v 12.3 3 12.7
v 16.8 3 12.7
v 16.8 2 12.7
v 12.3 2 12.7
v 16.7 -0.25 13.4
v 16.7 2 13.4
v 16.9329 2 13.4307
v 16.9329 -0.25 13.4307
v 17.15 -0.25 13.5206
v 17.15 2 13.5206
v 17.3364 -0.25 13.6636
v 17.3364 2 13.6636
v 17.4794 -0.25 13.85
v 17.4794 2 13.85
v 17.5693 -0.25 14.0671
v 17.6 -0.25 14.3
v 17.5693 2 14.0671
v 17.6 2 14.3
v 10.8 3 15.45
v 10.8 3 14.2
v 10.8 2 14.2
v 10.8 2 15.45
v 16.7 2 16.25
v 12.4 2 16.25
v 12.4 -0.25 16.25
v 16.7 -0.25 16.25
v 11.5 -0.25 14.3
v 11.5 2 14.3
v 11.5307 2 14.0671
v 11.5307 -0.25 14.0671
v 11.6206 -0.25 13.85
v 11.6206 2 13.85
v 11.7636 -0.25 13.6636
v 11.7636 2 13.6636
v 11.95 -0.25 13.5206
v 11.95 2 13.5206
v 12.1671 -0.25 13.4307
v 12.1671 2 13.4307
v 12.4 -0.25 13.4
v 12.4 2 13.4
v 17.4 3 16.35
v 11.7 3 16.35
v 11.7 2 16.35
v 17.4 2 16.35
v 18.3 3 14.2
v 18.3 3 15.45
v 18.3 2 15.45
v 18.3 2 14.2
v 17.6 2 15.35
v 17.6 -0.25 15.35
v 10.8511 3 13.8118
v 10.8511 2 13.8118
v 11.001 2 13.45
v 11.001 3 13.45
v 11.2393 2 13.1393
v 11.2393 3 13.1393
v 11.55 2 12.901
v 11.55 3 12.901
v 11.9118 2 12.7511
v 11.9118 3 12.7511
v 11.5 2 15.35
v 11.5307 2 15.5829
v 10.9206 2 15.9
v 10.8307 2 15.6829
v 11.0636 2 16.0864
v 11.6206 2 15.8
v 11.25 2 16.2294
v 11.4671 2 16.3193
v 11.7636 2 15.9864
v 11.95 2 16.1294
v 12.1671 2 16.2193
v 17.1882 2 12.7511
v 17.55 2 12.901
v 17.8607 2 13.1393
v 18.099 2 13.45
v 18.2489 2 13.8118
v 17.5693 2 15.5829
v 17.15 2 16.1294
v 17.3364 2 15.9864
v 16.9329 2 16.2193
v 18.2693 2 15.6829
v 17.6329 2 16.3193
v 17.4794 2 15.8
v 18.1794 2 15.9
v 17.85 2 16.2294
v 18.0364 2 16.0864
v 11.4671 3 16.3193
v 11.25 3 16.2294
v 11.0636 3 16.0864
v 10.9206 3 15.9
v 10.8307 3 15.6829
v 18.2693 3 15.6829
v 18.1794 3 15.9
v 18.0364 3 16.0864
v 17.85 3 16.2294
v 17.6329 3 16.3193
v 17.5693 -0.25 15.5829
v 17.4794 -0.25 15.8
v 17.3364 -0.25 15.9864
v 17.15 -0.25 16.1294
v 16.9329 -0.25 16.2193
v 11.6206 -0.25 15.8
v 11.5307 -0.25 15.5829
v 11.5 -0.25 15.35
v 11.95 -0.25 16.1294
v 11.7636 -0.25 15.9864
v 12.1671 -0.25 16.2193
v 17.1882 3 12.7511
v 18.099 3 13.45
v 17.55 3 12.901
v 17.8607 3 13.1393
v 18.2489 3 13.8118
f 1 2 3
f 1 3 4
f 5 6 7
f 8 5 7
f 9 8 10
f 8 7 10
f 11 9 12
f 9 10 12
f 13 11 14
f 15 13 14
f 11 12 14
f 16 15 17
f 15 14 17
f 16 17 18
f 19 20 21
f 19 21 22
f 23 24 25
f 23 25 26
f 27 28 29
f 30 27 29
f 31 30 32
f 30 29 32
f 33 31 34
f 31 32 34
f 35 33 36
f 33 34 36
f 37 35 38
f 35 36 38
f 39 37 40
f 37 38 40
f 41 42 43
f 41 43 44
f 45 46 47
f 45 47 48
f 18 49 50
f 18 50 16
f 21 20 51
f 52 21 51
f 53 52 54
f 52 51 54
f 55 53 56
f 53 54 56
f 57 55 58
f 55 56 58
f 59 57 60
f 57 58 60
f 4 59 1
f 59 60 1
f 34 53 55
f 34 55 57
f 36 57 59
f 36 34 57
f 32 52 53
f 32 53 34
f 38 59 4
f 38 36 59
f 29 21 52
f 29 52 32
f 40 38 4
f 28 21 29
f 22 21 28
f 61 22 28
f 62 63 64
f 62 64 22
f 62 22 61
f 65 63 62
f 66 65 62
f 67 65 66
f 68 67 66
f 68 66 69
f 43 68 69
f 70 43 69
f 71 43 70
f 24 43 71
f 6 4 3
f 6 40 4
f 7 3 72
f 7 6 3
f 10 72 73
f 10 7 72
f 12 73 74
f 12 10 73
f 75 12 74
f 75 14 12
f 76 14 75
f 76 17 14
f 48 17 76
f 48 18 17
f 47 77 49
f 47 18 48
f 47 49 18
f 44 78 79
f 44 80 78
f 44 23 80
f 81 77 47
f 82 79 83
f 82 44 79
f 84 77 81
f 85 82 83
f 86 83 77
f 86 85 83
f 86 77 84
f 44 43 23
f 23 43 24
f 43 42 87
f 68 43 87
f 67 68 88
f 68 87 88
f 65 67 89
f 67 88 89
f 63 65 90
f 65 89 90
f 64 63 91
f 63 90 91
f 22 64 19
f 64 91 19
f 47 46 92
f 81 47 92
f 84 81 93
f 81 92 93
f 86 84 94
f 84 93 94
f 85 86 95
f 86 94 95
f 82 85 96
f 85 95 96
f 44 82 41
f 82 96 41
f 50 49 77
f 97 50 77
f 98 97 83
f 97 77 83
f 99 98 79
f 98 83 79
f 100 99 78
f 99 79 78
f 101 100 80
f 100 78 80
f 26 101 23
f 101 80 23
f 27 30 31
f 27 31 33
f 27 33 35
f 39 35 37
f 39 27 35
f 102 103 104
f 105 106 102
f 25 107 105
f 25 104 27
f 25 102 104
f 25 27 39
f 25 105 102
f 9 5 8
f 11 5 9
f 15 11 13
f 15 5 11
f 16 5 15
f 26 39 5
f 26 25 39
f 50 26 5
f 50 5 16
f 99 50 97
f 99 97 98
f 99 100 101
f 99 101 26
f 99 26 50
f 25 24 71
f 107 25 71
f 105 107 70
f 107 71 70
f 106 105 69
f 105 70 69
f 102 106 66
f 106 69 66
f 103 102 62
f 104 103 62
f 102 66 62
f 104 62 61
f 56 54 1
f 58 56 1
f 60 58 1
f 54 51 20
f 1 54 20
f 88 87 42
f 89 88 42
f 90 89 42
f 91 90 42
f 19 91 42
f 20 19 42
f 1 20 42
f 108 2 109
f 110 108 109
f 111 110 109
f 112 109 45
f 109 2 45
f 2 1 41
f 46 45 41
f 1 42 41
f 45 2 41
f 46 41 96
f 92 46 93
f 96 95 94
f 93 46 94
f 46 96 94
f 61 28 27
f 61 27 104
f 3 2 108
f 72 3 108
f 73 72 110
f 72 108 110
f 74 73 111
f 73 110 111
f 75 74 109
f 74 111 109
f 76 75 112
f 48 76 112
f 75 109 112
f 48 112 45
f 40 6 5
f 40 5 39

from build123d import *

# Parameters (mm, degrees)
EXTRUDE015_DEPTH = 1
EXTRUDE014_DEPTH = 2.25


with BuildPart() as extrude015:
    # Sketch015 → Extrude015 (new body)
    with BuildSketch(Plane.XZ):
        with BuildLine():
            ThreePointArc((11.7, 16.35), (11.063604, 16.086396), (10.8, 15.45))
            Line((10.8, 14.2), (10.8, 15.45))
            ThreePointArc((10.8, 14.2), (11.23934, 13.13934), (12.3, 12.7))
            Line((16.8, 12.7), (12.3, 12.7))
            ThreePointArc((16.8, 12.7), (17.86066, 13.13934), (18.3, 14.2))
            Line((18.3, 15.45), (18.3, 14.2))
            ThreePointArc((18.3, 15.45), (18.036396, 16.086396), (17.4, 16.35))
            Line((11.7, 16.35), (17.4, 16.35))
        make_face()
    extrude(amount=EXTRUDE015_DEPTH)


with BuildPart() as extrude015_1:
    # Extrude015 placement: moved
    add(extrude015.part.moved(Location((0, 3, 0))))


with BuildPart() as button1:
    # Sketch014 → Extrude014 (new body)
    with BuildSketch(Plane.XZ):
        with BuildLine():
            ThreePointArc((12.4, 16.25), (11.763604, 15.986396), (11.5, 15.35))
            Line((11.5, 14.3), (11.5, 15.35))
            ThreePointArc((11.5, 14.3), (11.763604, 13.663604), (12.4, 13.4))
            Line((16.7, 13.4), (12.4, 13.4))
            ThreePointArc((16.7, 13.4), (17.336396, 13.663604), (17.6, 14.3))
            Line((17.6, 15.35), (17.6, 14.3))
            ThreePointArc((17.6, 15.35), (17.336396, 15.986396), (16.7, 16.25))
            Line((12.4, 16.25), (16.7, 16.25))
        make_face()
    extrude(amount=EXTRUDE014_DEPTH)


with BuildPart() as button1_1:
    # Extrude014 placement: moved
    add(button1.part.moved(Location((0, 2, 0))))

    # Fusion018: union Extrude015
    add(extrude015_1.part)


solid = button1_1.part
